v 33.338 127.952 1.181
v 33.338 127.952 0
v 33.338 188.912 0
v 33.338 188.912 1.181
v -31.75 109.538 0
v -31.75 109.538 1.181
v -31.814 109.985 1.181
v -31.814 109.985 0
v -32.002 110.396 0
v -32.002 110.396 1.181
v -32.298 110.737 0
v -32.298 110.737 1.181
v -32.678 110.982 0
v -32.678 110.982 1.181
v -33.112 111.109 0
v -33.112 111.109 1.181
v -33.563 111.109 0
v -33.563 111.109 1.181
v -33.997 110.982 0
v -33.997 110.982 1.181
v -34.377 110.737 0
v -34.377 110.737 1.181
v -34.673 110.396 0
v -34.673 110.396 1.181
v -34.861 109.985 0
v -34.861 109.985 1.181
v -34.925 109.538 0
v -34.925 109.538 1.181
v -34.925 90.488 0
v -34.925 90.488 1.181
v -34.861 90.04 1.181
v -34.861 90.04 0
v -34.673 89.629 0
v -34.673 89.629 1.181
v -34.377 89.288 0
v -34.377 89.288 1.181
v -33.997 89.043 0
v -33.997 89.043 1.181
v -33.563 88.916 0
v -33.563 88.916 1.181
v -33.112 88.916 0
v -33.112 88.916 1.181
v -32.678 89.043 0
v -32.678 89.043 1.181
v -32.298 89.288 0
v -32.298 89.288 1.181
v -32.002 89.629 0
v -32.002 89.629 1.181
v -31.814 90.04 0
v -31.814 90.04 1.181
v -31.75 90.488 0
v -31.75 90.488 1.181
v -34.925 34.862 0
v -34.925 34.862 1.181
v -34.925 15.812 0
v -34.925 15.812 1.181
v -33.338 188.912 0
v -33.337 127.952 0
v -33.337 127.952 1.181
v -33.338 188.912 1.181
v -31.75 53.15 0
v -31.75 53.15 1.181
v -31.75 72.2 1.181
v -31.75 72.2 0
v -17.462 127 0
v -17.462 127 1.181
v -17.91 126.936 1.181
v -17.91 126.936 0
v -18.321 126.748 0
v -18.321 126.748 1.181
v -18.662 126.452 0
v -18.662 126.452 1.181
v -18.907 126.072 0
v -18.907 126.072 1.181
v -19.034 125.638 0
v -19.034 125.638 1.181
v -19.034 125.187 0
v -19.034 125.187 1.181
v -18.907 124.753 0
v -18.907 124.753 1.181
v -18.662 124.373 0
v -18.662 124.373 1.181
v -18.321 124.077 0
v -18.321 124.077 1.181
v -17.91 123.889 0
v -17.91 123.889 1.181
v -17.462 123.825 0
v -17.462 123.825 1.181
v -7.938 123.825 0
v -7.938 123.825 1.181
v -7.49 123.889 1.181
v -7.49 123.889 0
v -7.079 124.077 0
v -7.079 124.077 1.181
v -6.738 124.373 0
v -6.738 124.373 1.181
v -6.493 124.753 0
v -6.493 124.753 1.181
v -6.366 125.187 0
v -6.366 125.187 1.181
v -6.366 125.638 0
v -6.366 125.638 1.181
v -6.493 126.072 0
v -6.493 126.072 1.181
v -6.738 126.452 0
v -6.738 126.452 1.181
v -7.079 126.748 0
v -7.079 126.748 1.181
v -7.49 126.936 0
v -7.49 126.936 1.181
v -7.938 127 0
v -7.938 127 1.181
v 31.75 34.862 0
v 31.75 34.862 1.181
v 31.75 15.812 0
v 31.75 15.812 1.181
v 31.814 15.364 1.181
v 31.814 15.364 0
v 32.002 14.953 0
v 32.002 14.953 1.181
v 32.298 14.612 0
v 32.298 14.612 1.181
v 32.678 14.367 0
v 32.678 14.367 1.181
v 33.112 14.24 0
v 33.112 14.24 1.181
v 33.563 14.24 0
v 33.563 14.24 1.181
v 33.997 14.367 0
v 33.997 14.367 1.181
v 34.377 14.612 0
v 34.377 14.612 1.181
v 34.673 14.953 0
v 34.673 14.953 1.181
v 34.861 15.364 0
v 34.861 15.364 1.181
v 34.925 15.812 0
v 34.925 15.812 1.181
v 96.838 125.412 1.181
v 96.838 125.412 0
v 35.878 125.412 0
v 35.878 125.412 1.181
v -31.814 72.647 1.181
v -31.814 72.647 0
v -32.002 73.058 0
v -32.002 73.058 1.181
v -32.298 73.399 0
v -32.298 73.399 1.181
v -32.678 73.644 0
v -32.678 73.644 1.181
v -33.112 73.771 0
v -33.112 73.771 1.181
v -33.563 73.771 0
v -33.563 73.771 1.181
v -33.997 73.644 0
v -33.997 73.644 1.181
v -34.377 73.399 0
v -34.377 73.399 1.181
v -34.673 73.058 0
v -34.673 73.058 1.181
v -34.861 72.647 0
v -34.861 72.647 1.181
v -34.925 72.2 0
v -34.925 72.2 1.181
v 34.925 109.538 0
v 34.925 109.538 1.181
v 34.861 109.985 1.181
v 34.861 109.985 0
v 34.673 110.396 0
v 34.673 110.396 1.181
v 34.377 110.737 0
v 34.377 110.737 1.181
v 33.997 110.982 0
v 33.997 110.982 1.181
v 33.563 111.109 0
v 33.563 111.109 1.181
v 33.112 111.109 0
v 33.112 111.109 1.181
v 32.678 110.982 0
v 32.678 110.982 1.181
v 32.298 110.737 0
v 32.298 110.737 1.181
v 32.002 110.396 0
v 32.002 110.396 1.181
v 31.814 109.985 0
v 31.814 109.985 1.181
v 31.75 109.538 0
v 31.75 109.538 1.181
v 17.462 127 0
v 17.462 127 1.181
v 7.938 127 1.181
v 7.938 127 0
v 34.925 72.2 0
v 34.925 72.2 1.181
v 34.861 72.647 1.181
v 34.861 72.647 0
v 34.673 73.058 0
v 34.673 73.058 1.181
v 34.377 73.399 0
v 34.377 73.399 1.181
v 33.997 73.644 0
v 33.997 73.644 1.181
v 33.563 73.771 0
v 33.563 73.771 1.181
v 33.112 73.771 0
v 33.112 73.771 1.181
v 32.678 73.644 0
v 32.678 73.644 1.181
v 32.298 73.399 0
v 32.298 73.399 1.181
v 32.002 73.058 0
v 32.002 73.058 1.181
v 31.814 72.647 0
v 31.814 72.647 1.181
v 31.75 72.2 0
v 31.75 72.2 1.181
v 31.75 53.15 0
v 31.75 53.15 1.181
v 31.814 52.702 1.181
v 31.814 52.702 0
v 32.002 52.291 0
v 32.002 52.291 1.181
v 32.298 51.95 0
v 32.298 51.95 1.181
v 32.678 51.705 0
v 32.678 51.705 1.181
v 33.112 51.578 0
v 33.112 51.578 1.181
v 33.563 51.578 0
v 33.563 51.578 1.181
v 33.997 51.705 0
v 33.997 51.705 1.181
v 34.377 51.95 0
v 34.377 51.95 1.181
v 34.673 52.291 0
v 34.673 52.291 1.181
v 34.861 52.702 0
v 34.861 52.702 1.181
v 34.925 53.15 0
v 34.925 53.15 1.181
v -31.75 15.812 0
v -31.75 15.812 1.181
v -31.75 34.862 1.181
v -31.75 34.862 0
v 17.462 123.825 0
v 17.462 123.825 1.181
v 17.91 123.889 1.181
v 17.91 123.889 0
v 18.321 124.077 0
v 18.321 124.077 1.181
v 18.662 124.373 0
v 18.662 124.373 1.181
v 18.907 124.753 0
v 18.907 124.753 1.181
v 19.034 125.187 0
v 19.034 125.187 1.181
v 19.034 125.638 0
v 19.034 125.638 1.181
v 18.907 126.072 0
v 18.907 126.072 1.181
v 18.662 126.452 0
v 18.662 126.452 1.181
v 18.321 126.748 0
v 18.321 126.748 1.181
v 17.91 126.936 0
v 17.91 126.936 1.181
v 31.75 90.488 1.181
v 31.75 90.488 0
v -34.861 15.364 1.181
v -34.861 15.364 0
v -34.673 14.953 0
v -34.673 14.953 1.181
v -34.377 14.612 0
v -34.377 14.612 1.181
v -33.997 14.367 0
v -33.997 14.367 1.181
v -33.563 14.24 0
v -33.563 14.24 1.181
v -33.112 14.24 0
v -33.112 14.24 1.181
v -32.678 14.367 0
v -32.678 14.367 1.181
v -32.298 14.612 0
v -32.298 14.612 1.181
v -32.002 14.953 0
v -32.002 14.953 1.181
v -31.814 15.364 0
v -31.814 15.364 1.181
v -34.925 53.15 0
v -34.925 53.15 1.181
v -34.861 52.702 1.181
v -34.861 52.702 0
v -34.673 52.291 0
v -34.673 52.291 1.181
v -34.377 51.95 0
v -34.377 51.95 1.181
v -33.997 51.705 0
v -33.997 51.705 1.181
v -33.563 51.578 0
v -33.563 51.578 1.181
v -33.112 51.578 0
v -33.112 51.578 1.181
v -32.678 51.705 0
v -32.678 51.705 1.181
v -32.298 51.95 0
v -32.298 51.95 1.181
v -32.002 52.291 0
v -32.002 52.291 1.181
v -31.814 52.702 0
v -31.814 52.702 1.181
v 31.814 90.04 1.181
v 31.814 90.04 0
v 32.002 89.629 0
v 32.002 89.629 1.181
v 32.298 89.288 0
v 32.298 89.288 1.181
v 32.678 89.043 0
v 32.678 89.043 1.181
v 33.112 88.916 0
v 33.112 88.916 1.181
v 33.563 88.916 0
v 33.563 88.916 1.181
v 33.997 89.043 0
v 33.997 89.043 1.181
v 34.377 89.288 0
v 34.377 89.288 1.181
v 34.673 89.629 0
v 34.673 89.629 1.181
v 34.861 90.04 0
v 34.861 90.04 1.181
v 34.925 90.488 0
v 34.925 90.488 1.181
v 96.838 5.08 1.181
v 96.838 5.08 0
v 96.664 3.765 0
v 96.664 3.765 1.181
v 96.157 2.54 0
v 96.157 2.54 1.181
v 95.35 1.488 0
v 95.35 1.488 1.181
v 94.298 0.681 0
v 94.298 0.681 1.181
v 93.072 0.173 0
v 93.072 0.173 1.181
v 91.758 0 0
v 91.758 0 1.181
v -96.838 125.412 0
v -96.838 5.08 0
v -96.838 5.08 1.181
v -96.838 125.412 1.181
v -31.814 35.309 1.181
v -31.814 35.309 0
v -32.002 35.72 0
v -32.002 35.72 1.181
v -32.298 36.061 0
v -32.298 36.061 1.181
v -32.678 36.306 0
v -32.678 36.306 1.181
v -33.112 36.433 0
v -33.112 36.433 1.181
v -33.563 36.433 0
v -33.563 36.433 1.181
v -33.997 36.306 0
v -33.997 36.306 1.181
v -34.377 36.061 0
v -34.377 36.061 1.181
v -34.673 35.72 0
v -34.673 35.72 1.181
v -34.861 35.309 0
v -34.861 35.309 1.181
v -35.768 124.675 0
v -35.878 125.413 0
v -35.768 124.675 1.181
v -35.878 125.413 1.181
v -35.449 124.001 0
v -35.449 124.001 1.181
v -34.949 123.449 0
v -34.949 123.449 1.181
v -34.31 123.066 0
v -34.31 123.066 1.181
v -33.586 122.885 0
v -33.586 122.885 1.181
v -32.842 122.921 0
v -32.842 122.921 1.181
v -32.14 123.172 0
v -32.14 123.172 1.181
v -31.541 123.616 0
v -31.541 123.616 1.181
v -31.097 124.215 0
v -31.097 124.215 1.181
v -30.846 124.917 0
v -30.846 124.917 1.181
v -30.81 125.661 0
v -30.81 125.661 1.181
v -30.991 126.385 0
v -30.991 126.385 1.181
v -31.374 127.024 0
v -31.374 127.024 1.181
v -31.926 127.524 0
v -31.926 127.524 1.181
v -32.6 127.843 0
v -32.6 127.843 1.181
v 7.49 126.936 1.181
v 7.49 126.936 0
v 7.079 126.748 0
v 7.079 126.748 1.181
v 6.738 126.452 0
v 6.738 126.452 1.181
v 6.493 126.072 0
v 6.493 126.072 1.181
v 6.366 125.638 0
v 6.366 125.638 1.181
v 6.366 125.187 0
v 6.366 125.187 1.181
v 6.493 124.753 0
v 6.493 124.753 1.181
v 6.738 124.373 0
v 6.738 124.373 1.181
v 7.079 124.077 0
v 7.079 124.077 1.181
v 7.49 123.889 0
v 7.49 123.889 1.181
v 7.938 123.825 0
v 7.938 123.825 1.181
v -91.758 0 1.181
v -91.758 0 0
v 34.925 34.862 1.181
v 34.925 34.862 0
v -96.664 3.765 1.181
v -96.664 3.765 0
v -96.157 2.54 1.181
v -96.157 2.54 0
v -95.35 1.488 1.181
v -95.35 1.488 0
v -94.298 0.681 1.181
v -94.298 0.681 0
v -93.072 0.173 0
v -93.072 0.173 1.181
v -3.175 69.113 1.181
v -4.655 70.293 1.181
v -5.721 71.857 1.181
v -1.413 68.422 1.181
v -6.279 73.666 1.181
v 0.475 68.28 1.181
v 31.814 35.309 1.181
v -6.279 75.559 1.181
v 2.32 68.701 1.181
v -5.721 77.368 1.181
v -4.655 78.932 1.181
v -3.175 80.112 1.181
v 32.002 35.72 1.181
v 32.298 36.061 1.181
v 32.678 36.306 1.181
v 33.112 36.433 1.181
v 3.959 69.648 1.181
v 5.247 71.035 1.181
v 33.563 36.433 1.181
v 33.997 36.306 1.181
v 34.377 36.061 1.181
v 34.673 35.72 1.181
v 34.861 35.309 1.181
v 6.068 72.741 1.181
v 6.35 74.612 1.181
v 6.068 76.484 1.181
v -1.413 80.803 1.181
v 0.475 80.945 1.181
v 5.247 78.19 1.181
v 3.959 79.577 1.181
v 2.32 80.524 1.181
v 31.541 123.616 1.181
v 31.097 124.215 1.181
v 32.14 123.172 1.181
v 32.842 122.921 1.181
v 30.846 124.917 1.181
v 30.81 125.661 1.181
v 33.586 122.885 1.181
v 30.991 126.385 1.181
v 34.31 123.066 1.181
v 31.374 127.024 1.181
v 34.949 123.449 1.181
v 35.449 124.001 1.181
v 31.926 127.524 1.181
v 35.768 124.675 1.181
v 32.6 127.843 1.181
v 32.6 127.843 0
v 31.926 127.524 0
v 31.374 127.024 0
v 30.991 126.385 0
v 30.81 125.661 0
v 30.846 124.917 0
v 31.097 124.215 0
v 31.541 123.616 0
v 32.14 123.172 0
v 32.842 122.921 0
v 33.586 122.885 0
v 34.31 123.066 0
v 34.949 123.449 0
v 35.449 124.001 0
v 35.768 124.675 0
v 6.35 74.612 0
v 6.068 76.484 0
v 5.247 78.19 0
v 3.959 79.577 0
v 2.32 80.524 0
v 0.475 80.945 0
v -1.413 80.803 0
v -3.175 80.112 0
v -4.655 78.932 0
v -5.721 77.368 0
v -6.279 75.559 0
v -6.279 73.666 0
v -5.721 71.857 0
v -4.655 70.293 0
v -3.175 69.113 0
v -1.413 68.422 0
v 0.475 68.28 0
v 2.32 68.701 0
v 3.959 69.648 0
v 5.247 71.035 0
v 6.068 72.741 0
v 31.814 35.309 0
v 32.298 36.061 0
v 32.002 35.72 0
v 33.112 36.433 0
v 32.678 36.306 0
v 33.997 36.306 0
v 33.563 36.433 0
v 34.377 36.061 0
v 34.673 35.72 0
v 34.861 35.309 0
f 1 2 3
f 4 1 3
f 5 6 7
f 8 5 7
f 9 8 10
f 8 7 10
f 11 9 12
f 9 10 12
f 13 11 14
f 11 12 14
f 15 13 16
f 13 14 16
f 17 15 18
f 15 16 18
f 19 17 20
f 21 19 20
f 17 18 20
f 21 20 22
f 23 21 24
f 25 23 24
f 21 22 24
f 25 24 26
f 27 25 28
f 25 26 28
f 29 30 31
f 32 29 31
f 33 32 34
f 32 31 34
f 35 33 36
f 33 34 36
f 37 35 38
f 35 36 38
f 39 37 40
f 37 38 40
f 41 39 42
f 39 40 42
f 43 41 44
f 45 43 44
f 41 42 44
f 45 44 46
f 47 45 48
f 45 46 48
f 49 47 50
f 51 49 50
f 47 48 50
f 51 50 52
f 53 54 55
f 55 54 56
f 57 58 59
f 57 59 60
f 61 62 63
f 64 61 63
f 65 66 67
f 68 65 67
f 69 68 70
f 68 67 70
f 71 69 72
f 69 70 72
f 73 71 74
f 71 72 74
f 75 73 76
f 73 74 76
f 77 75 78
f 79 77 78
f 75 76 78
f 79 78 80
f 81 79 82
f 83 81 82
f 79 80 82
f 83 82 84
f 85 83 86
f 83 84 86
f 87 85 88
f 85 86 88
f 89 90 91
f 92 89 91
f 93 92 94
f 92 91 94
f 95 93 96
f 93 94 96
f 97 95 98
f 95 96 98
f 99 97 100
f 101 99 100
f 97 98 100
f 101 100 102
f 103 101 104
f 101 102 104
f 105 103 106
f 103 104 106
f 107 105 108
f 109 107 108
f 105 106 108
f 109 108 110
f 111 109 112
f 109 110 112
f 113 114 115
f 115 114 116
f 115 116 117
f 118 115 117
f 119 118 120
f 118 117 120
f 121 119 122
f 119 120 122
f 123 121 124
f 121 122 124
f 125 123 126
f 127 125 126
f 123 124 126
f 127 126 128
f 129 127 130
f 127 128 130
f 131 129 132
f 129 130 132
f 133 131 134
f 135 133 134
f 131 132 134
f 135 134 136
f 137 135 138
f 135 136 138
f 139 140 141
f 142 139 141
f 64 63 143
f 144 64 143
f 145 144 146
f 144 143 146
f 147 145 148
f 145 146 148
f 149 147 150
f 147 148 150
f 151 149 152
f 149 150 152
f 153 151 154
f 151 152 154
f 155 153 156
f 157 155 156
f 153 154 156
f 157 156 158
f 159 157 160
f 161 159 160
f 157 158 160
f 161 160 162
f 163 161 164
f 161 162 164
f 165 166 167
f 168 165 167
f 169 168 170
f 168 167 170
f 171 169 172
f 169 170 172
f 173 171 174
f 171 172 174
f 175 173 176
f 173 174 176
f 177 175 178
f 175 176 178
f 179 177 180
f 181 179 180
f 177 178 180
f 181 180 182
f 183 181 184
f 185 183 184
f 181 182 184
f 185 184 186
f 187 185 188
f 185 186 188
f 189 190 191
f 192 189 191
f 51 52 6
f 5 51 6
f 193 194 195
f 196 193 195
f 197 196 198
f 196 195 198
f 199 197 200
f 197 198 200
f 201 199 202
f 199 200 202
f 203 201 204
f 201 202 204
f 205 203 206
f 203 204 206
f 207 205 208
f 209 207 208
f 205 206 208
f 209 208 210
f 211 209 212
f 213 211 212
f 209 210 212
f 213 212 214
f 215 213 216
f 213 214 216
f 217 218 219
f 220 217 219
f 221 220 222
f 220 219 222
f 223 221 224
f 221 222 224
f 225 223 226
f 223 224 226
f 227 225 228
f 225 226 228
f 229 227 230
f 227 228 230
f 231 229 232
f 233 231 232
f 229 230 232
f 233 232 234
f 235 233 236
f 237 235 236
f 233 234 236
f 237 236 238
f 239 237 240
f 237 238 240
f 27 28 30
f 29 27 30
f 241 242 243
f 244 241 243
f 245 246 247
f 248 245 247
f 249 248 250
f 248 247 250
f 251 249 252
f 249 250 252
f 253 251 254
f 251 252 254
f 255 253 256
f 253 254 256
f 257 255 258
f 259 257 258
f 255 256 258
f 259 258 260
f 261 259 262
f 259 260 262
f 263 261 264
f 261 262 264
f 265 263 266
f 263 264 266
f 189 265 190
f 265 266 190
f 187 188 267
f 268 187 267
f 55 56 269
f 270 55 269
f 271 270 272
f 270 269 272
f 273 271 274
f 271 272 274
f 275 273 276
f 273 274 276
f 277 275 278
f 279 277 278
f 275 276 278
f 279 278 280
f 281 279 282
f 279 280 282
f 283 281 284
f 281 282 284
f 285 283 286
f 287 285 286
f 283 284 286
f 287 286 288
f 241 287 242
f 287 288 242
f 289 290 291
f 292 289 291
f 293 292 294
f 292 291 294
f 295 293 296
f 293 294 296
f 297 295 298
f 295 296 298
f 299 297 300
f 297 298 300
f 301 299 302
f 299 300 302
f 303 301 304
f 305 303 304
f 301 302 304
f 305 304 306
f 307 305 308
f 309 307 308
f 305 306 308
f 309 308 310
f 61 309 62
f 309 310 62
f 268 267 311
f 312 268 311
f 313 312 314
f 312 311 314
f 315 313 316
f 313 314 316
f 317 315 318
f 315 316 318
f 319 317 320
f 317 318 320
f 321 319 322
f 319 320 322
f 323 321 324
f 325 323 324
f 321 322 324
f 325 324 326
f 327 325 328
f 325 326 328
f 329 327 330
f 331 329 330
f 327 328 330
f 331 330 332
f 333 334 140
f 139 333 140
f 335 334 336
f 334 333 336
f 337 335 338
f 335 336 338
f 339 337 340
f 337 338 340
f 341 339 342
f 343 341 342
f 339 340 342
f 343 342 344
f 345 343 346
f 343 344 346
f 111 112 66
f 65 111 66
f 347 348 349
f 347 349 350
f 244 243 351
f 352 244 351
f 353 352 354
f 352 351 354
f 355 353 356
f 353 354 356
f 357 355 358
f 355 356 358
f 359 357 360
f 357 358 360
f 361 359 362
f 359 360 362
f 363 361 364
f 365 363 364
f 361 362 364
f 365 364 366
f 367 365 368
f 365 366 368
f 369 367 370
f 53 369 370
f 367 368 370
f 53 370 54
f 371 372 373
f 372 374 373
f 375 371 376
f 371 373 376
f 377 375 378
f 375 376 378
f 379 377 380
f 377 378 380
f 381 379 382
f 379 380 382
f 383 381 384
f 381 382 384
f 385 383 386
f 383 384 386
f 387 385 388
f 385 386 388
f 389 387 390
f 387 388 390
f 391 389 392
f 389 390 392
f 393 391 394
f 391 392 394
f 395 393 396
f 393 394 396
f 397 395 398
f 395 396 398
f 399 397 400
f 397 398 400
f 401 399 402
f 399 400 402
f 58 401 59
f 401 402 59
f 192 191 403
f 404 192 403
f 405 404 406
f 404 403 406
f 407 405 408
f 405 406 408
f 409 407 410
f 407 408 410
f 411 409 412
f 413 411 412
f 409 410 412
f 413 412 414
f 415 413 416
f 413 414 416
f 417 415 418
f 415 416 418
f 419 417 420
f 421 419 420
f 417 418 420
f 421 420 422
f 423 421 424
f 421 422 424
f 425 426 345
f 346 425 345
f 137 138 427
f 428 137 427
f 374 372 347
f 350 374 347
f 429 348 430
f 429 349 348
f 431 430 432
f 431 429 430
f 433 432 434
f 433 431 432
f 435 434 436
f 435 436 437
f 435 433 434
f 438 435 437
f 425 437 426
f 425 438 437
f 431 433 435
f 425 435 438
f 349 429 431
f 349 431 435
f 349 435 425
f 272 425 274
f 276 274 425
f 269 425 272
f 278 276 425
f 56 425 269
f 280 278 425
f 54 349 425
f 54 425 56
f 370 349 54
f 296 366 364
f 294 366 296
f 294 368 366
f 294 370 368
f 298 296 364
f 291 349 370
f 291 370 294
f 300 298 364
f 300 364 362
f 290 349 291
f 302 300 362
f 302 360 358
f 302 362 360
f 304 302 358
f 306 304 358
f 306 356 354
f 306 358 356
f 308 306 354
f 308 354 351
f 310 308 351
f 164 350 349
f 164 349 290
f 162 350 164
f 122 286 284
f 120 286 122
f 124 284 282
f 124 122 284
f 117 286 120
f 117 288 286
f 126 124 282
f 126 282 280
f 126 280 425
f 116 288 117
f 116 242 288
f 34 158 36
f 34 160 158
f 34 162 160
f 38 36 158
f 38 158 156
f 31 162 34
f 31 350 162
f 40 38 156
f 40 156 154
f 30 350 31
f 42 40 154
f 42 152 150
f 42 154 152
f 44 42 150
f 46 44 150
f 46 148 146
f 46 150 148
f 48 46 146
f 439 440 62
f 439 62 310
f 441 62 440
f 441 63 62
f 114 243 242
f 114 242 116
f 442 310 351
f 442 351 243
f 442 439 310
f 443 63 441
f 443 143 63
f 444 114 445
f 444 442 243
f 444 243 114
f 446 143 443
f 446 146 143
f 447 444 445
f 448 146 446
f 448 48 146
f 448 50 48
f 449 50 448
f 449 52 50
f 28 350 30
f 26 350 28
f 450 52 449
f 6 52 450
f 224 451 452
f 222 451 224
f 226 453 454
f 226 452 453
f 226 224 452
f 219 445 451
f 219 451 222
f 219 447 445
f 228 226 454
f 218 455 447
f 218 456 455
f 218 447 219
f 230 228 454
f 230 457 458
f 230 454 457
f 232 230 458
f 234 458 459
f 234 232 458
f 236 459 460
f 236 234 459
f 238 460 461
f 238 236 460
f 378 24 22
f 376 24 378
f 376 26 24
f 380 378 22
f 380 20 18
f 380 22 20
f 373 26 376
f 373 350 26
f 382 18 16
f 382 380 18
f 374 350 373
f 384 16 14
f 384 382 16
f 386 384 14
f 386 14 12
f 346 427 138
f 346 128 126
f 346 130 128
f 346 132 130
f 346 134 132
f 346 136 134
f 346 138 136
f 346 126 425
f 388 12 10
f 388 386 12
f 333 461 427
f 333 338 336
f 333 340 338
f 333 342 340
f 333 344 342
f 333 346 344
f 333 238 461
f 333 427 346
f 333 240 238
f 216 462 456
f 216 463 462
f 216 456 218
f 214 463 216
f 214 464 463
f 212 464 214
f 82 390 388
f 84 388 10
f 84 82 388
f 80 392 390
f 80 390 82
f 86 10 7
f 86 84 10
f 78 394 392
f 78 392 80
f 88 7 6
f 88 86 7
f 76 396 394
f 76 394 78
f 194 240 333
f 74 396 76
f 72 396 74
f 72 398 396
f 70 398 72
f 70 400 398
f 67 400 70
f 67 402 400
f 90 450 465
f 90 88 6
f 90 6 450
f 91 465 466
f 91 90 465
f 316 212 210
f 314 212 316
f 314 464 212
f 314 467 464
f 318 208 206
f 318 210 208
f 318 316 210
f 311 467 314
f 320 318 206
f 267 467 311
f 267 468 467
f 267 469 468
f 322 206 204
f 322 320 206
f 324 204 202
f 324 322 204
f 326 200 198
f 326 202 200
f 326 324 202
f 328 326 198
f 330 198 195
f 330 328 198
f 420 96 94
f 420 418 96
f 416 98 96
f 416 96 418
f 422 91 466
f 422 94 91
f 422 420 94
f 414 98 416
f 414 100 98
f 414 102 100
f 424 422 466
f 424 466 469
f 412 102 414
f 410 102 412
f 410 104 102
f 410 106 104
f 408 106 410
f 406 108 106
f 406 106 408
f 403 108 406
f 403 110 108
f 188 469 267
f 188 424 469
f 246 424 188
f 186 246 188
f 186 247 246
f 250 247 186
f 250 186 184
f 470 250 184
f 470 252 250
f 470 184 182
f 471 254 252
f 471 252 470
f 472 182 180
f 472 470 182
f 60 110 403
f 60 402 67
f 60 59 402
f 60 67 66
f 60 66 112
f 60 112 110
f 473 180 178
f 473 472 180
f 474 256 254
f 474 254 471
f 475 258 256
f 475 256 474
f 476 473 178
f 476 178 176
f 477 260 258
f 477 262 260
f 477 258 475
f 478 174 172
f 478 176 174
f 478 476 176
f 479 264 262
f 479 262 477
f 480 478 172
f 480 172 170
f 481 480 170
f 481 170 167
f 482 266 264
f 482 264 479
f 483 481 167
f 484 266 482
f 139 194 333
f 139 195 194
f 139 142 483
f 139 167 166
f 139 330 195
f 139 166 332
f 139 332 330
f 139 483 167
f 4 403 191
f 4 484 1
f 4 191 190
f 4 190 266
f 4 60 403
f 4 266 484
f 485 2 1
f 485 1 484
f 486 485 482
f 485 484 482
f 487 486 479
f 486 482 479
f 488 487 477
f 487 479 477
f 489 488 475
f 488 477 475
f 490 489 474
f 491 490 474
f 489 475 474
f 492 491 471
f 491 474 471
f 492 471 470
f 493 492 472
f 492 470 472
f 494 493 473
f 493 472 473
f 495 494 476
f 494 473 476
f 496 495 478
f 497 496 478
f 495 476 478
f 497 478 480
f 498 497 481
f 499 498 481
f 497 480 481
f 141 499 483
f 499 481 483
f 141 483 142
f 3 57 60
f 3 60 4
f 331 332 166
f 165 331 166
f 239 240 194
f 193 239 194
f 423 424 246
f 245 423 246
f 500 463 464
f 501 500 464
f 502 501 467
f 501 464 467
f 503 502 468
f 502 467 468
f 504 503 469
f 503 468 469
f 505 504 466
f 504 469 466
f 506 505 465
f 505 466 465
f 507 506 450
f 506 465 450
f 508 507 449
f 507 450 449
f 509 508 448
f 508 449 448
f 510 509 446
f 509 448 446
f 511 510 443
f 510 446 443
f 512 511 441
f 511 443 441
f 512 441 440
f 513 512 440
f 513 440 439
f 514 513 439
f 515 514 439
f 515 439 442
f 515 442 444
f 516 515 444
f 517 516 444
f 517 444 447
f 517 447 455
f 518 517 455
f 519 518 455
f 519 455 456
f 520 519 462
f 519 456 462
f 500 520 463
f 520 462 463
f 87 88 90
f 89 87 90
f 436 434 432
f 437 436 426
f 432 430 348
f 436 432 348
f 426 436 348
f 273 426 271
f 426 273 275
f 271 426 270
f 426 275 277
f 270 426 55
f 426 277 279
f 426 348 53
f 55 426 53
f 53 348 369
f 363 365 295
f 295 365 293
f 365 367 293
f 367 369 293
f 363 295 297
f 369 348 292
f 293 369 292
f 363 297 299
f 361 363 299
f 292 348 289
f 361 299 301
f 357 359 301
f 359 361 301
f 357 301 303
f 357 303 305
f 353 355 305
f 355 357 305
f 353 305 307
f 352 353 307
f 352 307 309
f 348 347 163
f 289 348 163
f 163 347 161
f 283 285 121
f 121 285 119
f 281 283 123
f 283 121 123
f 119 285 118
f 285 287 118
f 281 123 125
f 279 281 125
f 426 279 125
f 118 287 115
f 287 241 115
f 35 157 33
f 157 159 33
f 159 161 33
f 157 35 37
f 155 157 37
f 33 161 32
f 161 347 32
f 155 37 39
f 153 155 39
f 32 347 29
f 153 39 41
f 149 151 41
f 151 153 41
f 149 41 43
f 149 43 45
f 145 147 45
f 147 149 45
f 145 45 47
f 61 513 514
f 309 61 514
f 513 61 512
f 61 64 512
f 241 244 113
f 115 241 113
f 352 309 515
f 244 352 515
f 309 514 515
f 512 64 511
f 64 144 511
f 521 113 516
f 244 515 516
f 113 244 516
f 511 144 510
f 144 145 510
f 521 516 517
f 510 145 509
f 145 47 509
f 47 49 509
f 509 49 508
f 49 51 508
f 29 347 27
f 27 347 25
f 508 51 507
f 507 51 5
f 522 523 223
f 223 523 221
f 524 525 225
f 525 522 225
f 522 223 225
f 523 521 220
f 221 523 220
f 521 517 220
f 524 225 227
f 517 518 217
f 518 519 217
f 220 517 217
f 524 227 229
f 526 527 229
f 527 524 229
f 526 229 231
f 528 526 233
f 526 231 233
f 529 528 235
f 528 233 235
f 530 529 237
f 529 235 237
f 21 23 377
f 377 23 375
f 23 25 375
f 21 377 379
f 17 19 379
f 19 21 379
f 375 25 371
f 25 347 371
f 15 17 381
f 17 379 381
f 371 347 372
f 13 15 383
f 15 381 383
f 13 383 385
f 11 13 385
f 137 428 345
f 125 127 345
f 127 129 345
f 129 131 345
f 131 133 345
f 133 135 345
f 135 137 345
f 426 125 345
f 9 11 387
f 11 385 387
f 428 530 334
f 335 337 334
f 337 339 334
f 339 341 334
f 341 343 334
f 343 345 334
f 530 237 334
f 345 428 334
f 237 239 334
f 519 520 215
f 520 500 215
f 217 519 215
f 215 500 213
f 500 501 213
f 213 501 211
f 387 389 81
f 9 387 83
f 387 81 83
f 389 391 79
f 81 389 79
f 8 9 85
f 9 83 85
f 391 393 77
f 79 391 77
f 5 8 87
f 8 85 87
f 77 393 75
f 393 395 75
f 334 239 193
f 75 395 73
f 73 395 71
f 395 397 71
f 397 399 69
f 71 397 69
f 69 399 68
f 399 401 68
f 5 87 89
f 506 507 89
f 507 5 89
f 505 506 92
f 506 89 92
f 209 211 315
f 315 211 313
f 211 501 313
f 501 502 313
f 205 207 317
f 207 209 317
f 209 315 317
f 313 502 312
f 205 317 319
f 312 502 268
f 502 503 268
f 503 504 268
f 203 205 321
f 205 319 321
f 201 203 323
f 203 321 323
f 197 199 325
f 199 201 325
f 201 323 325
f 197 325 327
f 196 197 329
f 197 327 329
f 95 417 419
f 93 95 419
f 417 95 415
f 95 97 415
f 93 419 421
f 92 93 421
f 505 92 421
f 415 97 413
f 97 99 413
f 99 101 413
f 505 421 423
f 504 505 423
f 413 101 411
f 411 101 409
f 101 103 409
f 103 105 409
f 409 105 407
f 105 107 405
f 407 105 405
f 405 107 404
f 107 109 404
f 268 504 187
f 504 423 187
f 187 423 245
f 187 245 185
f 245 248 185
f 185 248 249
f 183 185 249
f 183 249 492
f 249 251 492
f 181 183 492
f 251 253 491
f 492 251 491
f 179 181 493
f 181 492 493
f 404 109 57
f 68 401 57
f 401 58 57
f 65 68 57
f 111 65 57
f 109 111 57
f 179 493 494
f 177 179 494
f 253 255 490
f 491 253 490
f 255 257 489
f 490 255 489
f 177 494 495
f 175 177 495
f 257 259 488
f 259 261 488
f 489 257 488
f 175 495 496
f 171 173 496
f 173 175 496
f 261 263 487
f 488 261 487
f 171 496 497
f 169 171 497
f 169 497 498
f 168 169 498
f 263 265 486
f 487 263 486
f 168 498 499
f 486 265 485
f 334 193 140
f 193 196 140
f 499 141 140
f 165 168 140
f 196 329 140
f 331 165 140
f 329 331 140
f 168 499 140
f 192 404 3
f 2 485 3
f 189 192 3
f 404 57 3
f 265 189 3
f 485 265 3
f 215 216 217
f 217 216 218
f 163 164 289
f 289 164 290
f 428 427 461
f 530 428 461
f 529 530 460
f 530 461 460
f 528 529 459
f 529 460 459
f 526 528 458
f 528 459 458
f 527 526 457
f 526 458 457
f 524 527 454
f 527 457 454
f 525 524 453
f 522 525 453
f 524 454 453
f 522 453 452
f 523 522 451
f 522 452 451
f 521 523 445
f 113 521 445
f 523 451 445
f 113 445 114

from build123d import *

# Parameters (mm, degrees)
F0_W     = 66.675
F0_H     = 125.4125
F0_W_2   = 63.5
F0_H_2   = 63.5
F1_DEPTH = 1.1811
F2_R     = 2.54
F2_R_2   = 6.35
F3_DEPTH = 1.1811
F4_R     = 5.08


with BuildPart() as f1:
    # F0 (on Top) → F1 (new body)
    with BuildSketch(Plane.XY):
        with Locations((0, 62.70625)):
            Rectangle(F0_W, F0_H)
        with Locations((-65.0875, 62.70625)):
            Rectangle(F0_W_2, F0_H)
        with Locations((65.0875, 62.70625)):
            Rectangle(F0_W_2, F0_H)
        with Locations((0, 157.1625)):
            Rectangle(F0_W, F0_H_2)
    extrude(amount=F1_DEPTH)

    # F2 (on face) → F3 (cut, through all)
    with BuildSketch(Plane.XY.offset(1.1811)):
        with BuildLine():
            ThreePointArc((-31.75, 109.5375), (-33.3375, 111.125), (-34.925, 109.5375))
            Line((-34.925, 109.5375), (-34.925, 90.4875))
            ThreePointArc((-34.925, 90.4875), (-33.3375, 88.9), (-31.75, 90.4875))
            Line((-31.75, 90.4875), (-31.75, 109.5375))
        make_face()
        with BuildLine():
            ThreePointArc((-31.75, 72.1995), (-33.3375, 73.787), (-34.925, 72.1995))
            Line((-34.925, 72.1995), (-34.925, 53.1495))
            ThreePointArc((-34.925, 53.1495), (-33.3375, 51.562), (-31.75, 53.1495))
            Line((-31.75, 53.1495), (-31.75, 72.1995))
        make_face()
        with BuildLine():
            ThreePointArc((-31.75, 34.8615), (-33.3375, 36.449), (-34.925, 34.8615))
            Line((-34.925, 34.8615), (-34.925, 15.8115))
            ThreePointArc((-34.925, 15.8115), (-33.3375, 14.224), (-31.75, 15.8115))
            Line((-31.75, 15.8115), (-31.75, 34.8615))
        make_face()
        with BuildLine():
            ThreePointArc((34.925, 34.8615), (33.3375, 36.449), (31.75, 34.8615))
            Line((31.75, 34.8615), (31.75, 15.8115))
            ThreePointArc((31.75, 15.8115), (33.3375, 14.224), (34.925, 15.8115))
            Line((34.925, 15.8115), (34.925, 34.8615))
        make_face()
        with BuildLine():
            ThreePointArc((34.925, 72.1995), (33.3375, 73.787), (31.75, 72.1995))
            Line((31.75, 72.1995), (31.75, 53.1495))
            ThreePointArc((31.75, 53.1495), (33.3375, 51.562), (34.925, 53.1495))
            Line((34.925, 53.1495), (34.925, 72.1995))
        make_face()
        with BuildLine():
            ThreePointArc((34.925, 109.5375), (33.3375, 111.125), (31.75, 109.5375))
            Line((31.75, 109.5375), (31.75, 90.4875))
            ThreePointArc((31.75, 90.4875), (33.3375, 88.9), (34.925, 90.4875))
            Line((34.925, 90.4875), (34.925, 109.5375))
        make_face()
        with BuildLine():
            ThreePointArc((-17.4625, 127), (-19.05, 125.4125), (-17.4625, 123.825))
            Line((-17.4625, 123.825), (-7.9375, 123.825))
            ThreePointArc((-7.9375, 123.825), (-6.35, 125.4125), (-7.9375, 127))
            Line((-7.9375, 127), (-17.4625, 127))
        make_face()
        with BuildLine():
            ThreePointArc((7.9375, 127), (6.35, 125.4125), (7.9375, 123.825))
            Line((7.9375, 123.825), (17.4625, 123.825))
            ThreePointArc((17.4625, 123.825), (19.05, 125.4125), (17.4625, 127))
            Line((17.4625, 127), (7.9375, 127))
        make_face()
        with Locations((-33.3375, 125.4125)):
            Circle(F2_R)
        with Locations((33.3375, 125.4125)):
            Circle(F2_R)
        with Locations((0, 74.6125)):
            Circle(F2_R_2)
    extrude(amount=-F3_DEPTH, mode=Mode.SUBTRACT)

    # F4
    f4_edges = [f1.edges().sort_by_distance(p)[0] for p in [
        (-96.8375, 0, 0.59055),
        (96.8375, 0, 0.59055),
    ]]
    fillet(f4_edges, radius=F4_R)


solid = f1.part
